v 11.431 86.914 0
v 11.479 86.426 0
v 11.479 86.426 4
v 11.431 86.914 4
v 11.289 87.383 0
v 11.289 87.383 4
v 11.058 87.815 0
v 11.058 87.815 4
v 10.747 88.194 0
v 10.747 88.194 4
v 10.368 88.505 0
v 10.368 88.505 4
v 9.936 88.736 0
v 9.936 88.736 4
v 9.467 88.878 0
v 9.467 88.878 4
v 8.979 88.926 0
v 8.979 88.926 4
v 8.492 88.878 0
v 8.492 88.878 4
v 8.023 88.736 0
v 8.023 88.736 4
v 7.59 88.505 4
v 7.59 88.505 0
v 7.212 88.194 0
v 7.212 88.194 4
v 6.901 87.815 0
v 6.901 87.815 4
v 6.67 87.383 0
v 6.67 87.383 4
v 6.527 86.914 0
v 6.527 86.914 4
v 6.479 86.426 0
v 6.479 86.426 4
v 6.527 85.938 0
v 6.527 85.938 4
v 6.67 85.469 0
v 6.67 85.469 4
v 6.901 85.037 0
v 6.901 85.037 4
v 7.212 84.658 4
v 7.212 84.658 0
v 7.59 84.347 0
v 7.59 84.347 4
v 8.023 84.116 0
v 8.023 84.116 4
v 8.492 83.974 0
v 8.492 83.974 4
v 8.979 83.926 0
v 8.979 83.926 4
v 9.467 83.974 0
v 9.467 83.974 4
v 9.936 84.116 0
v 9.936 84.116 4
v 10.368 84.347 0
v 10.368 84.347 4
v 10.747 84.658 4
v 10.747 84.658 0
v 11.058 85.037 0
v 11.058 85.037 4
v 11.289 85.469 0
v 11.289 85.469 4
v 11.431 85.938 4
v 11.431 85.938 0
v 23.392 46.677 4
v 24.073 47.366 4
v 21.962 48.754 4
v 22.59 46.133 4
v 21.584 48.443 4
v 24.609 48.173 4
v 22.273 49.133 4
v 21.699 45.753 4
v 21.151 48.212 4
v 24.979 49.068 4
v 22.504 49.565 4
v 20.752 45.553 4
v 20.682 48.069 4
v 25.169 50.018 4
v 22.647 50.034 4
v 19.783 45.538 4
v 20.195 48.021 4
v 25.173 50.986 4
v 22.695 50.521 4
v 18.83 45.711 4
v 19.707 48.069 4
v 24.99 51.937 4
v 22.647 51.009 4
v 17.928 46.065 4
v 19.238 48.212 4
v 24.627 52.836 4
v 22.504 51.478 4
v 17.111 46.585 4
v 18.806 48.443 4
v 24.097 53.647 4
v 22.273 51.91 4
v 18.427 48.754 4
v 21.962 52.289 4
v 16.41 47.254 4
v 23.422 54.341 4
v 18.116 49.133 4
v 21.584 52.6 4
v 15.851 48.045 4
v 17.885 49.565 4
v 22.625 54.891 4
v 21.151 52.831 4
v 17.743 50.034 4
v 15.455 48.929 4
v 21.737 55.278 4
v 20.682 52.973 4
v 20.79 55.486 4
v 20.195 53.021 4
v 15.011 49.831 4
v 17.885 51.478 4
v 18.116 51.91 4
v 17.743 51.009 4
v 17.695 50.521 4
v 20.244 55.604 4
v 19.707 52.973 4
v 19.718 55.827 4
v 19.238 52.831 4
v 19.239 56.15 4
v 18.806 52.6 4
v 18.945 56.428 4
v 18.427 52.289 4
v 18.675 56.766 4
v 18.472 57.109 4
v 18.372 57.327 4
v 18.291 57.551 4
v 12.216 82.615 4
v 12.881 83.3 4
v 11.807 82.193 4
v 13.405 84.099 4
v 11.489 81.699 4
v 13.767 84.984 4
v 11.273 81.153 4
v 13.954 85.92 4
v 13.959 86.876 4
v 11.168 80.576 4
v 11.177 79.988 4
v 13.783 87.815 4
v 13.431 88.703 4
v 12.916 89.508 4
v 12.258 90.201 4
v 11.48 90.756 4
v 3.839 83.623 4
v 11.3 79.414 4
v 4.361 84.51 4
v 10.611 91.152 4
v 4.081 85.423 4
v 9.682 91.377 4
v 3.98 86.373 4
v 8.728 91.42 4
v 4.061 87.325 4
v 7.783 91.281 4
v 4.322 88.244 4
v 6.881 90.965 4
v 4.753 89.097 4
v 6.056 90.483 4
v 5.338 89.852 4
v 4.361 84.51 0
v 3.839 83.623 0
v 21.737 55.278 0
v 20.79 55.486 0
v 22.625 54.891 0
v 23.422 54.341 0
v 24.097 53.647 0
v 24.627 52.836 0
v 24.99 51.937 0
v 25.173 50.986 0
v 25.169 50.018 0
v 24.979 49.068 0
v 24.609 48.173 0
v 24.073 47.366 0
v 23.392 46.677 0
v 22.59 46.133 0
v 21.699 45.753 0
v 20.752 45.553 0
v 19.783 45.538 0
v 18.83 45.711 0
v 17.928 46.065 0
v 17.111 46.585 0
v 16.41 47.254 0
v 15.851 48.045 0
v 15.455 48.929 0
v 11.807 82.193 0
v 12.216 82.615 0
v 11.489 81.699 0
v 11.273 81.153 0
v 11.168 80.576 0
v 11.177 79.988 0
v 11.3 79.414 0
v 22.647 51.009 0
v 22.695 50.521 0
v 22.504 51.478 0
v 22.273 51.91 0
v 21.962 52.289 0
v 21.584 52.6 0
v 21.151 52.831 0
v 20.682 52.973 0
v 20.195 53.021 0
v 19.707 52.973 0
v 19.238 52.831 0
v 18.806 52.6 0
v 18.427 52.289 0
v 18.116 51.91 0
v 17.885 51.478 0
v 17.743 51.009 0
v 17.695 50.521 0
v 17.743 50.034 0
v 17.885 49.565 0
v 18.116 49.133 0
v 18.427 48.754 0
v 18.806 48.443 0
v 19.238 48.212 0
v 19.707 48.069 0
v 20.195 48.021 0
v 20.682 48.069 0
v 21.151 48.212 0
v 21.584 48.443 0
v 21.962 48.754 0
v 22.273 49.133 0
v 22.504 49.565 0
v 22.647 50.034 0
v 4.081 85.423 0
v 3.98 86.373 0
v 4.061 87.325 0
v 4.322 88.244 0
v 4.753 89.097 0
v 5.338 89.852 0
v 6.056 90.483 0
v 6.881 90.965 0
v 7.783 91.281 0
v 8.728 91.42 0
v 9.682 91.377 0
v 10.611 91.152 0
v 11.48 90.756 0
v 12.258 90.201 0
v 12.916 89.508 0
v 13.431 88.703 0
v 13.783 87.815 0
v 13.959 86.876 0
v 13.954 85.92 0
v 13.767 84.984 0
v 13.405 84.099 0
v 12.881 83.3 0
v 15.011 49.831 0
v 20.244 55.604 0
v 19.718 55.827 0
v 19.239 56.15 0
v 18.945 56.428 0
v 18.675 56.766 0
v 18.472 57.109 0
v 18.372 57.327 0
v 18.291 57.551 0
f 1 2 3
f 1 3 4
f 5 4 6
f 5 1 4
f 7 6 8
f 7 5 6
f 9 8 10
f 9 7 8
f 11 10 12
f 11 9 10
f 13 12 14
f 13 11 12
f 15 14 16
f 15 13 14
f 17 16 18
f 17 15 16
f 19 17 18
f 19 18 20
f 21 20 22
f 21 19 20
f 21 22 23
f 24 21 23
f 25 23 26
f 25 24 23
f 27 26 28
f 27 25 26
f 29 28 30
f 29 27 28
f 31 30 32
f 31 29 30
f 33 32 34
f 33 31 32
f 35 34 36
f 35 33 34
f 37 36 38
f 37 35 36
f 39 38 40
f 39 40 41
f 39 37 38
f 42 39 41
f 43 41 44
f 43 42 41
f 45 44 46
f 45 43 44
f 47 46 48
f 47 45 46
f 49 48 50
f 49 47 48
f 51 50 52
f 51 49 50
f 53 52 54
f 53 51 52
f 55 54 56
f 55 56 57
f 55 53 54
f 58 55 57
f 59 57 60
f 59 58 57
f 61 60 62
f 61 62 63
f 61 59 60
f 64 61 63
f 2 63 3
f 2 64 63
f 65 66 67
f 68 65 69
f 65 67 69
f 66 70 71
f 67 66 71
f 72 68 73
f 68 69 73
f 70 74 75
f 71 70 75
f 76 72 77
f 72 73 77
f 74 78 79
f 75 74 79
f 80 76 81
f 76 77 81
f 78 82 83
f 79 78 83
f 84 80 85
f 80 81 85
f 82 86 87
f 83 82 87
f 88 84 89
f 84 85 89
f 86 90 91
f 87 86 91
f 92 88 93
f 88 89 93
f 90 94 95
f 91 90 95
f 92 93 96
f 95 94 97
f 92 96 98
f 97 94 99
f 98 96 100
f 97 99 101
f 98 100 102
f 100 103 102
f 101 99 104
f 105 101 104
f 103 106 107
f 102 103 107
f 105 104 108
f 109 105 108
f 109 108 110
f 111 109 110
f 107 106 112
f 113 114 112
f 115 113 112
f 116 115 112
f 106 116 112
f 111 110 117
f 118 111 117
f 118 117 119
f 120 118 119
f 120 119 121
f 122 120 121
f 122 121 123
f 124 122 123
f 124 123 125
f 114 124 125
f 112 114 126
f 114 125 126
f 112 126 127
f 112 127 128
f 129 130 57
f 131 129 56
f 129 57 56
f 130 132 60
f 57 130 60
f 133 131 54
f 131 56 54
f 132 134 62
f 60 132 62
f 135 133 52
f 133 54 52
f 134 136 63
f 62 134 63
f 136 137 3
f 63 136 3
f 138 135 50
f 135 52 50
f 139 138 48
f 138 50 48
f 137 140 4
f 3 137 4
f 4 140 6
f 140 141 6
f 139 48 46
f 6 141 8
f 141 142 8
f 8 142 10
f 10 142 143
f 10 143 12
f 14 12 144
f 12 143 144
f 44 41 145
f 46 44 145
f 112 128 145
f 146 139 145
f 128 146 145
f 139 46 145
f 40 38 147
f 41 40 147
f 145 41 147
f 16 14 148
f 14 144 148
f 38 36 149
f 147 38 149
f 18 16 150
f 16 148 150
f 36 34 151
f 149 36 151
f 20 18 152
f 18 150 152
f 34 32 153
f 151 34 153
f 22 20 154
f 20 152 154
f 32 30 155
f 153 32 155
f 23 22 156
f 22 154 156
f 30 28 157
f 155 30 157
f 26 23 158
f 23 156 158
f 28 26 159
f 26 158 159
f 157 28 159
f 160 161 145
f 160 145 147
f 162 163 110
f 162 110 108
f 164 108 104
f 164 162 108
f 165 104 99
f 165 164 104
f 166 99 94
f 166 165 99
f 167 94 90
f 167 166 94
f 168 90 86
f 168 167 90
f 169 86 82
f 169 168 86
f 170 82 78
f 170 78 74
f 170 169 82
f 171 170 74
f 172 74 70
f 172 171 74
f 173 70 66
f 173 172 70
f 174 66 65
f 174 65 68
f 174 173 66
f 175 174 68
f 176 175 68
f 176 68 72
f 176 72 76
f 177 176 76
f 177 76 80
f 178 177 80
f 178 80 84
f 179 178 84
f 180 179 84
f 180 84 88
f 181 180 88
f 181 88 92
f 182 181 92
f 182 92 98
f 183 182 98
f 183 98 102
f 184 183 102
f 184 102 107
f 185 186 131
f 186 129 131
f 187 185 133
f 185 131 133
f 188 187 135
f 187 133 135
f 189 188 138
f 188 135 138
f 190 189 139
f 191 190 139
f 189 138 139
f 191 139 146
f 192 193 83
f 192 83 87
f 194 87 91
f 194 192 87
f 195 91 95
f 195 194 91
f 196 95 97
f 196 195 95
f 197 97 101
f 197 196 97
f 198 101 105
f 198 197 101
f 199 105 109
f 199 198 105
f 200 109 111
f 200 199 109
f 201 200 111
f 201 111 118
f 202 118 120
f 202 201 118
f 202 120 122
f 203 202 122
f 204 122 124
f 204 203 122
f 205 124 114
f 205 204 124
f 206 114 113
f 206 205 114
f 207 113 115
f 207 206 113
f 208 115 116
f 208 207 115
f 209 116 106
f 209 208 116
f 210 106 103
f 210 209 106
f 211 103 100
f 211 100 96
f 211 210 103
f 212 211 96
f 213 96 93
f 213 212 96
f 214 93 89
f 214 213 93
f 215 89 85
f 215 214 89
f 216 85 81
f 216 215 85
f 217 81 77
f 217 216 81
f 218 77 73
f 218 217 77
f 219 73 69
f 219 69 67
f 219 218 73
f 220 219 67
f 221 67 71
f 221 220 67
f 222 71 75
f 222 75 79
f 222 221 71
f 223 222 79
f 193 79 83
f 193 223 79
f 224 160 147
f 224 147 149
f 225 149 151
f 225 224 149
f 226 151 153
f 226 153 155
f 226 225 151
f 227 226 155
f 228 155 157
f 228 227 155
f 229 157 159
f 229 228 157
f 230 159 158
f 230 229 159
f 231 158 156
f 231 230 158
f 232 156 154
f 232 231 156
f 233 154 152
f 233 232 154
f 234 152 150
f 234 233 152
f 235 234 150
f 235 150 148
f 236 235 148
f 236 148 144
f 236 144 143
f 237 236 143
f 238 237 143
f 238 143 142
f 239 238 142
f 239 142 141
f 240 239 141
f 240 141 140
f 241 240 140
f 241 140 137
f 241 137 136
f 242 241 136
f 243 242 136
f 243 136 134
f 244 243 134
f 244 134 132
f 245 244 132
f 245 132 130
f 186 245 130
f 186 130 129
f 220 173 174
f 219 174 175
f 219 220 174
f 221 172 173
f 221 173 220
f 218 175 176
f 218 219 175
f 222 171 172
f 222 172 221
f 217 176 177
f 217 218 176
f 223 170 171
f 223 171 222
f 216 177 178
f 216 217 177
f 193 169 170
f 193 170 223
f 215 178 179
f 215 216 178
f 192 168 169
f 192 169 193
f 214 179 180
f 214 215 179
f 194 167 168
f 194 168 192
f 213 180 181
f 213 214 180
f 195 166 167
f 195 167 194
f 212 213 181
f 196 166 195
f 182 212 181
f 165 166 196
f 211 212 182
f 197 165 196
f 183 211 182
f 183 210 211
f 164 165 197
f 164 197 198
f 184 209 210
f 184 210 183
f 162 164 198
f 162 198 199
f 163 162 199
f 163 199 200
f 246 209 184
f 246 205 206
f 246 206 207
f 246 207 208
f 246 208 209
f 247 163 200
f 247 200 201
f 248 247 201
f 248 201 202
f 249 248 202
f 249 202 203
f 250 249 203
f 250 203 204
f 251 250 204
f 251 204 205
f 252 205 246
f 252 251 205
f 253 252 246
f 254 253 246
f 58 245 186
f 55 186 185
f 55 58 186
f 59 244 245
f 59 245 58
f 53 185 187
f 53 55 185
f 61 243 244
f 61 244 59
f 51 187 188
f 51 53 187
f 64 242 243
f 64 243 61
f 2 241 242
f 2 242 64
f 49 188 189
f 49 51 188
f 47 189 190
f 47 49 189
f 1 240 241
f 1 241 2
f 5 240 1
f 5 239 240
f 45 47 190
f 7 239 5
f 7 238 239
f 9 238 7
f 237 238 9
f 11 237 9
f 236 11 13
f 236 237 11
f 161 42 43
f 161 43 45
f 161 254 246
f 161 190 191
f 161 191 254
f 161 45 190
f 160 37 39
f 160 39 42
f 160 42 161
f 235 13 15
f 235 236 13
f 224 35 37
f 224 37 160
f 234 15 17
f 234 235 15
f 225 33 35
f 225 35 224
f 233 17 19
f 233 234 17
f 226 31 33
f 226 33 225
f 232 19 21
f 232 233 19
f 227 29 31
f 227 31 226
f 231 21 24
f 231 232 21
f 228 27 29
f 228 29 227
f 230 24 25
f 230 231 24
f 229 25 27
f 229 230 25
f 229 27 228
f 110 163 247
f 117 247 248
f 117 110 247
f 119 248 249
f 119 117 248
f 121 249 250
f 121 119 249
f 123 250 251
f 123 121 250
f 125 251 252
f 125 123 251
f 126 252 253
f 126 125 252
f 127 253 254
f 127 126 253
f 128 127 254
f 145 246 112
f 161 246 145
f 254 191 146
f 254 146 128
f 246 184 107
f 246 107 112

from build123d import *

# Parameters (mm, degrees)
SKETCH1_R           = 2.5
BOSS_EXTRUDE1_DEPTH = 4
FILLET2_R           = 3


with BuildPart() as part:
    # Sketch1 → Boss-Extrude1 (new body)
    with BuildSketch(Plane.XY):
        with BuildLine():
            Line((15.011053362, 49.830662375), (3.838692378, 83.622901822))
            Line((3.838692378, 83.622901822), (4.361186649, 84.509770663))
            ThreePointArc((4.361186649, 84.509770663), (11.04786713, 90.978220722), (10.57313596, 81.686979022))
            Line((10.57313596, 81.686979022), (18.898131325, 55.650415498))
            Line((18.898131325, 55.650415498), (18.969275223, 55.368960637))
            ThreePointArc((18.969275223, 55.368960637), (24.583713079, 48.126504338), (15.45509163, 48.928599175))
            Line((15.45509163, 48.928599175), (15.011053362, 49.830662375))
        make_face()
        with Locations((8.979351439, 86.426161535)):
            Circle(SKETCH1_R, mode=Mode.SUBTRACT)
        with Locations((20.194596002, 50.521426317)):
            Circle(SKETCH1_R, mode=Mode.SUBTRACT)
    extrude(amount=BOSS_EXTRUDE1_DEPTH)

    # Fillet2
    fillet2_edges = [part.edges().sort_by_distance(p)[0] for p in [
        (18.969275223, 55.368960637, 2),
        (10.57313596, 81.686979022, 2),
    ]]
    fillet(fillet2_edges, radius=FILLET2_R)


solid = part.part
